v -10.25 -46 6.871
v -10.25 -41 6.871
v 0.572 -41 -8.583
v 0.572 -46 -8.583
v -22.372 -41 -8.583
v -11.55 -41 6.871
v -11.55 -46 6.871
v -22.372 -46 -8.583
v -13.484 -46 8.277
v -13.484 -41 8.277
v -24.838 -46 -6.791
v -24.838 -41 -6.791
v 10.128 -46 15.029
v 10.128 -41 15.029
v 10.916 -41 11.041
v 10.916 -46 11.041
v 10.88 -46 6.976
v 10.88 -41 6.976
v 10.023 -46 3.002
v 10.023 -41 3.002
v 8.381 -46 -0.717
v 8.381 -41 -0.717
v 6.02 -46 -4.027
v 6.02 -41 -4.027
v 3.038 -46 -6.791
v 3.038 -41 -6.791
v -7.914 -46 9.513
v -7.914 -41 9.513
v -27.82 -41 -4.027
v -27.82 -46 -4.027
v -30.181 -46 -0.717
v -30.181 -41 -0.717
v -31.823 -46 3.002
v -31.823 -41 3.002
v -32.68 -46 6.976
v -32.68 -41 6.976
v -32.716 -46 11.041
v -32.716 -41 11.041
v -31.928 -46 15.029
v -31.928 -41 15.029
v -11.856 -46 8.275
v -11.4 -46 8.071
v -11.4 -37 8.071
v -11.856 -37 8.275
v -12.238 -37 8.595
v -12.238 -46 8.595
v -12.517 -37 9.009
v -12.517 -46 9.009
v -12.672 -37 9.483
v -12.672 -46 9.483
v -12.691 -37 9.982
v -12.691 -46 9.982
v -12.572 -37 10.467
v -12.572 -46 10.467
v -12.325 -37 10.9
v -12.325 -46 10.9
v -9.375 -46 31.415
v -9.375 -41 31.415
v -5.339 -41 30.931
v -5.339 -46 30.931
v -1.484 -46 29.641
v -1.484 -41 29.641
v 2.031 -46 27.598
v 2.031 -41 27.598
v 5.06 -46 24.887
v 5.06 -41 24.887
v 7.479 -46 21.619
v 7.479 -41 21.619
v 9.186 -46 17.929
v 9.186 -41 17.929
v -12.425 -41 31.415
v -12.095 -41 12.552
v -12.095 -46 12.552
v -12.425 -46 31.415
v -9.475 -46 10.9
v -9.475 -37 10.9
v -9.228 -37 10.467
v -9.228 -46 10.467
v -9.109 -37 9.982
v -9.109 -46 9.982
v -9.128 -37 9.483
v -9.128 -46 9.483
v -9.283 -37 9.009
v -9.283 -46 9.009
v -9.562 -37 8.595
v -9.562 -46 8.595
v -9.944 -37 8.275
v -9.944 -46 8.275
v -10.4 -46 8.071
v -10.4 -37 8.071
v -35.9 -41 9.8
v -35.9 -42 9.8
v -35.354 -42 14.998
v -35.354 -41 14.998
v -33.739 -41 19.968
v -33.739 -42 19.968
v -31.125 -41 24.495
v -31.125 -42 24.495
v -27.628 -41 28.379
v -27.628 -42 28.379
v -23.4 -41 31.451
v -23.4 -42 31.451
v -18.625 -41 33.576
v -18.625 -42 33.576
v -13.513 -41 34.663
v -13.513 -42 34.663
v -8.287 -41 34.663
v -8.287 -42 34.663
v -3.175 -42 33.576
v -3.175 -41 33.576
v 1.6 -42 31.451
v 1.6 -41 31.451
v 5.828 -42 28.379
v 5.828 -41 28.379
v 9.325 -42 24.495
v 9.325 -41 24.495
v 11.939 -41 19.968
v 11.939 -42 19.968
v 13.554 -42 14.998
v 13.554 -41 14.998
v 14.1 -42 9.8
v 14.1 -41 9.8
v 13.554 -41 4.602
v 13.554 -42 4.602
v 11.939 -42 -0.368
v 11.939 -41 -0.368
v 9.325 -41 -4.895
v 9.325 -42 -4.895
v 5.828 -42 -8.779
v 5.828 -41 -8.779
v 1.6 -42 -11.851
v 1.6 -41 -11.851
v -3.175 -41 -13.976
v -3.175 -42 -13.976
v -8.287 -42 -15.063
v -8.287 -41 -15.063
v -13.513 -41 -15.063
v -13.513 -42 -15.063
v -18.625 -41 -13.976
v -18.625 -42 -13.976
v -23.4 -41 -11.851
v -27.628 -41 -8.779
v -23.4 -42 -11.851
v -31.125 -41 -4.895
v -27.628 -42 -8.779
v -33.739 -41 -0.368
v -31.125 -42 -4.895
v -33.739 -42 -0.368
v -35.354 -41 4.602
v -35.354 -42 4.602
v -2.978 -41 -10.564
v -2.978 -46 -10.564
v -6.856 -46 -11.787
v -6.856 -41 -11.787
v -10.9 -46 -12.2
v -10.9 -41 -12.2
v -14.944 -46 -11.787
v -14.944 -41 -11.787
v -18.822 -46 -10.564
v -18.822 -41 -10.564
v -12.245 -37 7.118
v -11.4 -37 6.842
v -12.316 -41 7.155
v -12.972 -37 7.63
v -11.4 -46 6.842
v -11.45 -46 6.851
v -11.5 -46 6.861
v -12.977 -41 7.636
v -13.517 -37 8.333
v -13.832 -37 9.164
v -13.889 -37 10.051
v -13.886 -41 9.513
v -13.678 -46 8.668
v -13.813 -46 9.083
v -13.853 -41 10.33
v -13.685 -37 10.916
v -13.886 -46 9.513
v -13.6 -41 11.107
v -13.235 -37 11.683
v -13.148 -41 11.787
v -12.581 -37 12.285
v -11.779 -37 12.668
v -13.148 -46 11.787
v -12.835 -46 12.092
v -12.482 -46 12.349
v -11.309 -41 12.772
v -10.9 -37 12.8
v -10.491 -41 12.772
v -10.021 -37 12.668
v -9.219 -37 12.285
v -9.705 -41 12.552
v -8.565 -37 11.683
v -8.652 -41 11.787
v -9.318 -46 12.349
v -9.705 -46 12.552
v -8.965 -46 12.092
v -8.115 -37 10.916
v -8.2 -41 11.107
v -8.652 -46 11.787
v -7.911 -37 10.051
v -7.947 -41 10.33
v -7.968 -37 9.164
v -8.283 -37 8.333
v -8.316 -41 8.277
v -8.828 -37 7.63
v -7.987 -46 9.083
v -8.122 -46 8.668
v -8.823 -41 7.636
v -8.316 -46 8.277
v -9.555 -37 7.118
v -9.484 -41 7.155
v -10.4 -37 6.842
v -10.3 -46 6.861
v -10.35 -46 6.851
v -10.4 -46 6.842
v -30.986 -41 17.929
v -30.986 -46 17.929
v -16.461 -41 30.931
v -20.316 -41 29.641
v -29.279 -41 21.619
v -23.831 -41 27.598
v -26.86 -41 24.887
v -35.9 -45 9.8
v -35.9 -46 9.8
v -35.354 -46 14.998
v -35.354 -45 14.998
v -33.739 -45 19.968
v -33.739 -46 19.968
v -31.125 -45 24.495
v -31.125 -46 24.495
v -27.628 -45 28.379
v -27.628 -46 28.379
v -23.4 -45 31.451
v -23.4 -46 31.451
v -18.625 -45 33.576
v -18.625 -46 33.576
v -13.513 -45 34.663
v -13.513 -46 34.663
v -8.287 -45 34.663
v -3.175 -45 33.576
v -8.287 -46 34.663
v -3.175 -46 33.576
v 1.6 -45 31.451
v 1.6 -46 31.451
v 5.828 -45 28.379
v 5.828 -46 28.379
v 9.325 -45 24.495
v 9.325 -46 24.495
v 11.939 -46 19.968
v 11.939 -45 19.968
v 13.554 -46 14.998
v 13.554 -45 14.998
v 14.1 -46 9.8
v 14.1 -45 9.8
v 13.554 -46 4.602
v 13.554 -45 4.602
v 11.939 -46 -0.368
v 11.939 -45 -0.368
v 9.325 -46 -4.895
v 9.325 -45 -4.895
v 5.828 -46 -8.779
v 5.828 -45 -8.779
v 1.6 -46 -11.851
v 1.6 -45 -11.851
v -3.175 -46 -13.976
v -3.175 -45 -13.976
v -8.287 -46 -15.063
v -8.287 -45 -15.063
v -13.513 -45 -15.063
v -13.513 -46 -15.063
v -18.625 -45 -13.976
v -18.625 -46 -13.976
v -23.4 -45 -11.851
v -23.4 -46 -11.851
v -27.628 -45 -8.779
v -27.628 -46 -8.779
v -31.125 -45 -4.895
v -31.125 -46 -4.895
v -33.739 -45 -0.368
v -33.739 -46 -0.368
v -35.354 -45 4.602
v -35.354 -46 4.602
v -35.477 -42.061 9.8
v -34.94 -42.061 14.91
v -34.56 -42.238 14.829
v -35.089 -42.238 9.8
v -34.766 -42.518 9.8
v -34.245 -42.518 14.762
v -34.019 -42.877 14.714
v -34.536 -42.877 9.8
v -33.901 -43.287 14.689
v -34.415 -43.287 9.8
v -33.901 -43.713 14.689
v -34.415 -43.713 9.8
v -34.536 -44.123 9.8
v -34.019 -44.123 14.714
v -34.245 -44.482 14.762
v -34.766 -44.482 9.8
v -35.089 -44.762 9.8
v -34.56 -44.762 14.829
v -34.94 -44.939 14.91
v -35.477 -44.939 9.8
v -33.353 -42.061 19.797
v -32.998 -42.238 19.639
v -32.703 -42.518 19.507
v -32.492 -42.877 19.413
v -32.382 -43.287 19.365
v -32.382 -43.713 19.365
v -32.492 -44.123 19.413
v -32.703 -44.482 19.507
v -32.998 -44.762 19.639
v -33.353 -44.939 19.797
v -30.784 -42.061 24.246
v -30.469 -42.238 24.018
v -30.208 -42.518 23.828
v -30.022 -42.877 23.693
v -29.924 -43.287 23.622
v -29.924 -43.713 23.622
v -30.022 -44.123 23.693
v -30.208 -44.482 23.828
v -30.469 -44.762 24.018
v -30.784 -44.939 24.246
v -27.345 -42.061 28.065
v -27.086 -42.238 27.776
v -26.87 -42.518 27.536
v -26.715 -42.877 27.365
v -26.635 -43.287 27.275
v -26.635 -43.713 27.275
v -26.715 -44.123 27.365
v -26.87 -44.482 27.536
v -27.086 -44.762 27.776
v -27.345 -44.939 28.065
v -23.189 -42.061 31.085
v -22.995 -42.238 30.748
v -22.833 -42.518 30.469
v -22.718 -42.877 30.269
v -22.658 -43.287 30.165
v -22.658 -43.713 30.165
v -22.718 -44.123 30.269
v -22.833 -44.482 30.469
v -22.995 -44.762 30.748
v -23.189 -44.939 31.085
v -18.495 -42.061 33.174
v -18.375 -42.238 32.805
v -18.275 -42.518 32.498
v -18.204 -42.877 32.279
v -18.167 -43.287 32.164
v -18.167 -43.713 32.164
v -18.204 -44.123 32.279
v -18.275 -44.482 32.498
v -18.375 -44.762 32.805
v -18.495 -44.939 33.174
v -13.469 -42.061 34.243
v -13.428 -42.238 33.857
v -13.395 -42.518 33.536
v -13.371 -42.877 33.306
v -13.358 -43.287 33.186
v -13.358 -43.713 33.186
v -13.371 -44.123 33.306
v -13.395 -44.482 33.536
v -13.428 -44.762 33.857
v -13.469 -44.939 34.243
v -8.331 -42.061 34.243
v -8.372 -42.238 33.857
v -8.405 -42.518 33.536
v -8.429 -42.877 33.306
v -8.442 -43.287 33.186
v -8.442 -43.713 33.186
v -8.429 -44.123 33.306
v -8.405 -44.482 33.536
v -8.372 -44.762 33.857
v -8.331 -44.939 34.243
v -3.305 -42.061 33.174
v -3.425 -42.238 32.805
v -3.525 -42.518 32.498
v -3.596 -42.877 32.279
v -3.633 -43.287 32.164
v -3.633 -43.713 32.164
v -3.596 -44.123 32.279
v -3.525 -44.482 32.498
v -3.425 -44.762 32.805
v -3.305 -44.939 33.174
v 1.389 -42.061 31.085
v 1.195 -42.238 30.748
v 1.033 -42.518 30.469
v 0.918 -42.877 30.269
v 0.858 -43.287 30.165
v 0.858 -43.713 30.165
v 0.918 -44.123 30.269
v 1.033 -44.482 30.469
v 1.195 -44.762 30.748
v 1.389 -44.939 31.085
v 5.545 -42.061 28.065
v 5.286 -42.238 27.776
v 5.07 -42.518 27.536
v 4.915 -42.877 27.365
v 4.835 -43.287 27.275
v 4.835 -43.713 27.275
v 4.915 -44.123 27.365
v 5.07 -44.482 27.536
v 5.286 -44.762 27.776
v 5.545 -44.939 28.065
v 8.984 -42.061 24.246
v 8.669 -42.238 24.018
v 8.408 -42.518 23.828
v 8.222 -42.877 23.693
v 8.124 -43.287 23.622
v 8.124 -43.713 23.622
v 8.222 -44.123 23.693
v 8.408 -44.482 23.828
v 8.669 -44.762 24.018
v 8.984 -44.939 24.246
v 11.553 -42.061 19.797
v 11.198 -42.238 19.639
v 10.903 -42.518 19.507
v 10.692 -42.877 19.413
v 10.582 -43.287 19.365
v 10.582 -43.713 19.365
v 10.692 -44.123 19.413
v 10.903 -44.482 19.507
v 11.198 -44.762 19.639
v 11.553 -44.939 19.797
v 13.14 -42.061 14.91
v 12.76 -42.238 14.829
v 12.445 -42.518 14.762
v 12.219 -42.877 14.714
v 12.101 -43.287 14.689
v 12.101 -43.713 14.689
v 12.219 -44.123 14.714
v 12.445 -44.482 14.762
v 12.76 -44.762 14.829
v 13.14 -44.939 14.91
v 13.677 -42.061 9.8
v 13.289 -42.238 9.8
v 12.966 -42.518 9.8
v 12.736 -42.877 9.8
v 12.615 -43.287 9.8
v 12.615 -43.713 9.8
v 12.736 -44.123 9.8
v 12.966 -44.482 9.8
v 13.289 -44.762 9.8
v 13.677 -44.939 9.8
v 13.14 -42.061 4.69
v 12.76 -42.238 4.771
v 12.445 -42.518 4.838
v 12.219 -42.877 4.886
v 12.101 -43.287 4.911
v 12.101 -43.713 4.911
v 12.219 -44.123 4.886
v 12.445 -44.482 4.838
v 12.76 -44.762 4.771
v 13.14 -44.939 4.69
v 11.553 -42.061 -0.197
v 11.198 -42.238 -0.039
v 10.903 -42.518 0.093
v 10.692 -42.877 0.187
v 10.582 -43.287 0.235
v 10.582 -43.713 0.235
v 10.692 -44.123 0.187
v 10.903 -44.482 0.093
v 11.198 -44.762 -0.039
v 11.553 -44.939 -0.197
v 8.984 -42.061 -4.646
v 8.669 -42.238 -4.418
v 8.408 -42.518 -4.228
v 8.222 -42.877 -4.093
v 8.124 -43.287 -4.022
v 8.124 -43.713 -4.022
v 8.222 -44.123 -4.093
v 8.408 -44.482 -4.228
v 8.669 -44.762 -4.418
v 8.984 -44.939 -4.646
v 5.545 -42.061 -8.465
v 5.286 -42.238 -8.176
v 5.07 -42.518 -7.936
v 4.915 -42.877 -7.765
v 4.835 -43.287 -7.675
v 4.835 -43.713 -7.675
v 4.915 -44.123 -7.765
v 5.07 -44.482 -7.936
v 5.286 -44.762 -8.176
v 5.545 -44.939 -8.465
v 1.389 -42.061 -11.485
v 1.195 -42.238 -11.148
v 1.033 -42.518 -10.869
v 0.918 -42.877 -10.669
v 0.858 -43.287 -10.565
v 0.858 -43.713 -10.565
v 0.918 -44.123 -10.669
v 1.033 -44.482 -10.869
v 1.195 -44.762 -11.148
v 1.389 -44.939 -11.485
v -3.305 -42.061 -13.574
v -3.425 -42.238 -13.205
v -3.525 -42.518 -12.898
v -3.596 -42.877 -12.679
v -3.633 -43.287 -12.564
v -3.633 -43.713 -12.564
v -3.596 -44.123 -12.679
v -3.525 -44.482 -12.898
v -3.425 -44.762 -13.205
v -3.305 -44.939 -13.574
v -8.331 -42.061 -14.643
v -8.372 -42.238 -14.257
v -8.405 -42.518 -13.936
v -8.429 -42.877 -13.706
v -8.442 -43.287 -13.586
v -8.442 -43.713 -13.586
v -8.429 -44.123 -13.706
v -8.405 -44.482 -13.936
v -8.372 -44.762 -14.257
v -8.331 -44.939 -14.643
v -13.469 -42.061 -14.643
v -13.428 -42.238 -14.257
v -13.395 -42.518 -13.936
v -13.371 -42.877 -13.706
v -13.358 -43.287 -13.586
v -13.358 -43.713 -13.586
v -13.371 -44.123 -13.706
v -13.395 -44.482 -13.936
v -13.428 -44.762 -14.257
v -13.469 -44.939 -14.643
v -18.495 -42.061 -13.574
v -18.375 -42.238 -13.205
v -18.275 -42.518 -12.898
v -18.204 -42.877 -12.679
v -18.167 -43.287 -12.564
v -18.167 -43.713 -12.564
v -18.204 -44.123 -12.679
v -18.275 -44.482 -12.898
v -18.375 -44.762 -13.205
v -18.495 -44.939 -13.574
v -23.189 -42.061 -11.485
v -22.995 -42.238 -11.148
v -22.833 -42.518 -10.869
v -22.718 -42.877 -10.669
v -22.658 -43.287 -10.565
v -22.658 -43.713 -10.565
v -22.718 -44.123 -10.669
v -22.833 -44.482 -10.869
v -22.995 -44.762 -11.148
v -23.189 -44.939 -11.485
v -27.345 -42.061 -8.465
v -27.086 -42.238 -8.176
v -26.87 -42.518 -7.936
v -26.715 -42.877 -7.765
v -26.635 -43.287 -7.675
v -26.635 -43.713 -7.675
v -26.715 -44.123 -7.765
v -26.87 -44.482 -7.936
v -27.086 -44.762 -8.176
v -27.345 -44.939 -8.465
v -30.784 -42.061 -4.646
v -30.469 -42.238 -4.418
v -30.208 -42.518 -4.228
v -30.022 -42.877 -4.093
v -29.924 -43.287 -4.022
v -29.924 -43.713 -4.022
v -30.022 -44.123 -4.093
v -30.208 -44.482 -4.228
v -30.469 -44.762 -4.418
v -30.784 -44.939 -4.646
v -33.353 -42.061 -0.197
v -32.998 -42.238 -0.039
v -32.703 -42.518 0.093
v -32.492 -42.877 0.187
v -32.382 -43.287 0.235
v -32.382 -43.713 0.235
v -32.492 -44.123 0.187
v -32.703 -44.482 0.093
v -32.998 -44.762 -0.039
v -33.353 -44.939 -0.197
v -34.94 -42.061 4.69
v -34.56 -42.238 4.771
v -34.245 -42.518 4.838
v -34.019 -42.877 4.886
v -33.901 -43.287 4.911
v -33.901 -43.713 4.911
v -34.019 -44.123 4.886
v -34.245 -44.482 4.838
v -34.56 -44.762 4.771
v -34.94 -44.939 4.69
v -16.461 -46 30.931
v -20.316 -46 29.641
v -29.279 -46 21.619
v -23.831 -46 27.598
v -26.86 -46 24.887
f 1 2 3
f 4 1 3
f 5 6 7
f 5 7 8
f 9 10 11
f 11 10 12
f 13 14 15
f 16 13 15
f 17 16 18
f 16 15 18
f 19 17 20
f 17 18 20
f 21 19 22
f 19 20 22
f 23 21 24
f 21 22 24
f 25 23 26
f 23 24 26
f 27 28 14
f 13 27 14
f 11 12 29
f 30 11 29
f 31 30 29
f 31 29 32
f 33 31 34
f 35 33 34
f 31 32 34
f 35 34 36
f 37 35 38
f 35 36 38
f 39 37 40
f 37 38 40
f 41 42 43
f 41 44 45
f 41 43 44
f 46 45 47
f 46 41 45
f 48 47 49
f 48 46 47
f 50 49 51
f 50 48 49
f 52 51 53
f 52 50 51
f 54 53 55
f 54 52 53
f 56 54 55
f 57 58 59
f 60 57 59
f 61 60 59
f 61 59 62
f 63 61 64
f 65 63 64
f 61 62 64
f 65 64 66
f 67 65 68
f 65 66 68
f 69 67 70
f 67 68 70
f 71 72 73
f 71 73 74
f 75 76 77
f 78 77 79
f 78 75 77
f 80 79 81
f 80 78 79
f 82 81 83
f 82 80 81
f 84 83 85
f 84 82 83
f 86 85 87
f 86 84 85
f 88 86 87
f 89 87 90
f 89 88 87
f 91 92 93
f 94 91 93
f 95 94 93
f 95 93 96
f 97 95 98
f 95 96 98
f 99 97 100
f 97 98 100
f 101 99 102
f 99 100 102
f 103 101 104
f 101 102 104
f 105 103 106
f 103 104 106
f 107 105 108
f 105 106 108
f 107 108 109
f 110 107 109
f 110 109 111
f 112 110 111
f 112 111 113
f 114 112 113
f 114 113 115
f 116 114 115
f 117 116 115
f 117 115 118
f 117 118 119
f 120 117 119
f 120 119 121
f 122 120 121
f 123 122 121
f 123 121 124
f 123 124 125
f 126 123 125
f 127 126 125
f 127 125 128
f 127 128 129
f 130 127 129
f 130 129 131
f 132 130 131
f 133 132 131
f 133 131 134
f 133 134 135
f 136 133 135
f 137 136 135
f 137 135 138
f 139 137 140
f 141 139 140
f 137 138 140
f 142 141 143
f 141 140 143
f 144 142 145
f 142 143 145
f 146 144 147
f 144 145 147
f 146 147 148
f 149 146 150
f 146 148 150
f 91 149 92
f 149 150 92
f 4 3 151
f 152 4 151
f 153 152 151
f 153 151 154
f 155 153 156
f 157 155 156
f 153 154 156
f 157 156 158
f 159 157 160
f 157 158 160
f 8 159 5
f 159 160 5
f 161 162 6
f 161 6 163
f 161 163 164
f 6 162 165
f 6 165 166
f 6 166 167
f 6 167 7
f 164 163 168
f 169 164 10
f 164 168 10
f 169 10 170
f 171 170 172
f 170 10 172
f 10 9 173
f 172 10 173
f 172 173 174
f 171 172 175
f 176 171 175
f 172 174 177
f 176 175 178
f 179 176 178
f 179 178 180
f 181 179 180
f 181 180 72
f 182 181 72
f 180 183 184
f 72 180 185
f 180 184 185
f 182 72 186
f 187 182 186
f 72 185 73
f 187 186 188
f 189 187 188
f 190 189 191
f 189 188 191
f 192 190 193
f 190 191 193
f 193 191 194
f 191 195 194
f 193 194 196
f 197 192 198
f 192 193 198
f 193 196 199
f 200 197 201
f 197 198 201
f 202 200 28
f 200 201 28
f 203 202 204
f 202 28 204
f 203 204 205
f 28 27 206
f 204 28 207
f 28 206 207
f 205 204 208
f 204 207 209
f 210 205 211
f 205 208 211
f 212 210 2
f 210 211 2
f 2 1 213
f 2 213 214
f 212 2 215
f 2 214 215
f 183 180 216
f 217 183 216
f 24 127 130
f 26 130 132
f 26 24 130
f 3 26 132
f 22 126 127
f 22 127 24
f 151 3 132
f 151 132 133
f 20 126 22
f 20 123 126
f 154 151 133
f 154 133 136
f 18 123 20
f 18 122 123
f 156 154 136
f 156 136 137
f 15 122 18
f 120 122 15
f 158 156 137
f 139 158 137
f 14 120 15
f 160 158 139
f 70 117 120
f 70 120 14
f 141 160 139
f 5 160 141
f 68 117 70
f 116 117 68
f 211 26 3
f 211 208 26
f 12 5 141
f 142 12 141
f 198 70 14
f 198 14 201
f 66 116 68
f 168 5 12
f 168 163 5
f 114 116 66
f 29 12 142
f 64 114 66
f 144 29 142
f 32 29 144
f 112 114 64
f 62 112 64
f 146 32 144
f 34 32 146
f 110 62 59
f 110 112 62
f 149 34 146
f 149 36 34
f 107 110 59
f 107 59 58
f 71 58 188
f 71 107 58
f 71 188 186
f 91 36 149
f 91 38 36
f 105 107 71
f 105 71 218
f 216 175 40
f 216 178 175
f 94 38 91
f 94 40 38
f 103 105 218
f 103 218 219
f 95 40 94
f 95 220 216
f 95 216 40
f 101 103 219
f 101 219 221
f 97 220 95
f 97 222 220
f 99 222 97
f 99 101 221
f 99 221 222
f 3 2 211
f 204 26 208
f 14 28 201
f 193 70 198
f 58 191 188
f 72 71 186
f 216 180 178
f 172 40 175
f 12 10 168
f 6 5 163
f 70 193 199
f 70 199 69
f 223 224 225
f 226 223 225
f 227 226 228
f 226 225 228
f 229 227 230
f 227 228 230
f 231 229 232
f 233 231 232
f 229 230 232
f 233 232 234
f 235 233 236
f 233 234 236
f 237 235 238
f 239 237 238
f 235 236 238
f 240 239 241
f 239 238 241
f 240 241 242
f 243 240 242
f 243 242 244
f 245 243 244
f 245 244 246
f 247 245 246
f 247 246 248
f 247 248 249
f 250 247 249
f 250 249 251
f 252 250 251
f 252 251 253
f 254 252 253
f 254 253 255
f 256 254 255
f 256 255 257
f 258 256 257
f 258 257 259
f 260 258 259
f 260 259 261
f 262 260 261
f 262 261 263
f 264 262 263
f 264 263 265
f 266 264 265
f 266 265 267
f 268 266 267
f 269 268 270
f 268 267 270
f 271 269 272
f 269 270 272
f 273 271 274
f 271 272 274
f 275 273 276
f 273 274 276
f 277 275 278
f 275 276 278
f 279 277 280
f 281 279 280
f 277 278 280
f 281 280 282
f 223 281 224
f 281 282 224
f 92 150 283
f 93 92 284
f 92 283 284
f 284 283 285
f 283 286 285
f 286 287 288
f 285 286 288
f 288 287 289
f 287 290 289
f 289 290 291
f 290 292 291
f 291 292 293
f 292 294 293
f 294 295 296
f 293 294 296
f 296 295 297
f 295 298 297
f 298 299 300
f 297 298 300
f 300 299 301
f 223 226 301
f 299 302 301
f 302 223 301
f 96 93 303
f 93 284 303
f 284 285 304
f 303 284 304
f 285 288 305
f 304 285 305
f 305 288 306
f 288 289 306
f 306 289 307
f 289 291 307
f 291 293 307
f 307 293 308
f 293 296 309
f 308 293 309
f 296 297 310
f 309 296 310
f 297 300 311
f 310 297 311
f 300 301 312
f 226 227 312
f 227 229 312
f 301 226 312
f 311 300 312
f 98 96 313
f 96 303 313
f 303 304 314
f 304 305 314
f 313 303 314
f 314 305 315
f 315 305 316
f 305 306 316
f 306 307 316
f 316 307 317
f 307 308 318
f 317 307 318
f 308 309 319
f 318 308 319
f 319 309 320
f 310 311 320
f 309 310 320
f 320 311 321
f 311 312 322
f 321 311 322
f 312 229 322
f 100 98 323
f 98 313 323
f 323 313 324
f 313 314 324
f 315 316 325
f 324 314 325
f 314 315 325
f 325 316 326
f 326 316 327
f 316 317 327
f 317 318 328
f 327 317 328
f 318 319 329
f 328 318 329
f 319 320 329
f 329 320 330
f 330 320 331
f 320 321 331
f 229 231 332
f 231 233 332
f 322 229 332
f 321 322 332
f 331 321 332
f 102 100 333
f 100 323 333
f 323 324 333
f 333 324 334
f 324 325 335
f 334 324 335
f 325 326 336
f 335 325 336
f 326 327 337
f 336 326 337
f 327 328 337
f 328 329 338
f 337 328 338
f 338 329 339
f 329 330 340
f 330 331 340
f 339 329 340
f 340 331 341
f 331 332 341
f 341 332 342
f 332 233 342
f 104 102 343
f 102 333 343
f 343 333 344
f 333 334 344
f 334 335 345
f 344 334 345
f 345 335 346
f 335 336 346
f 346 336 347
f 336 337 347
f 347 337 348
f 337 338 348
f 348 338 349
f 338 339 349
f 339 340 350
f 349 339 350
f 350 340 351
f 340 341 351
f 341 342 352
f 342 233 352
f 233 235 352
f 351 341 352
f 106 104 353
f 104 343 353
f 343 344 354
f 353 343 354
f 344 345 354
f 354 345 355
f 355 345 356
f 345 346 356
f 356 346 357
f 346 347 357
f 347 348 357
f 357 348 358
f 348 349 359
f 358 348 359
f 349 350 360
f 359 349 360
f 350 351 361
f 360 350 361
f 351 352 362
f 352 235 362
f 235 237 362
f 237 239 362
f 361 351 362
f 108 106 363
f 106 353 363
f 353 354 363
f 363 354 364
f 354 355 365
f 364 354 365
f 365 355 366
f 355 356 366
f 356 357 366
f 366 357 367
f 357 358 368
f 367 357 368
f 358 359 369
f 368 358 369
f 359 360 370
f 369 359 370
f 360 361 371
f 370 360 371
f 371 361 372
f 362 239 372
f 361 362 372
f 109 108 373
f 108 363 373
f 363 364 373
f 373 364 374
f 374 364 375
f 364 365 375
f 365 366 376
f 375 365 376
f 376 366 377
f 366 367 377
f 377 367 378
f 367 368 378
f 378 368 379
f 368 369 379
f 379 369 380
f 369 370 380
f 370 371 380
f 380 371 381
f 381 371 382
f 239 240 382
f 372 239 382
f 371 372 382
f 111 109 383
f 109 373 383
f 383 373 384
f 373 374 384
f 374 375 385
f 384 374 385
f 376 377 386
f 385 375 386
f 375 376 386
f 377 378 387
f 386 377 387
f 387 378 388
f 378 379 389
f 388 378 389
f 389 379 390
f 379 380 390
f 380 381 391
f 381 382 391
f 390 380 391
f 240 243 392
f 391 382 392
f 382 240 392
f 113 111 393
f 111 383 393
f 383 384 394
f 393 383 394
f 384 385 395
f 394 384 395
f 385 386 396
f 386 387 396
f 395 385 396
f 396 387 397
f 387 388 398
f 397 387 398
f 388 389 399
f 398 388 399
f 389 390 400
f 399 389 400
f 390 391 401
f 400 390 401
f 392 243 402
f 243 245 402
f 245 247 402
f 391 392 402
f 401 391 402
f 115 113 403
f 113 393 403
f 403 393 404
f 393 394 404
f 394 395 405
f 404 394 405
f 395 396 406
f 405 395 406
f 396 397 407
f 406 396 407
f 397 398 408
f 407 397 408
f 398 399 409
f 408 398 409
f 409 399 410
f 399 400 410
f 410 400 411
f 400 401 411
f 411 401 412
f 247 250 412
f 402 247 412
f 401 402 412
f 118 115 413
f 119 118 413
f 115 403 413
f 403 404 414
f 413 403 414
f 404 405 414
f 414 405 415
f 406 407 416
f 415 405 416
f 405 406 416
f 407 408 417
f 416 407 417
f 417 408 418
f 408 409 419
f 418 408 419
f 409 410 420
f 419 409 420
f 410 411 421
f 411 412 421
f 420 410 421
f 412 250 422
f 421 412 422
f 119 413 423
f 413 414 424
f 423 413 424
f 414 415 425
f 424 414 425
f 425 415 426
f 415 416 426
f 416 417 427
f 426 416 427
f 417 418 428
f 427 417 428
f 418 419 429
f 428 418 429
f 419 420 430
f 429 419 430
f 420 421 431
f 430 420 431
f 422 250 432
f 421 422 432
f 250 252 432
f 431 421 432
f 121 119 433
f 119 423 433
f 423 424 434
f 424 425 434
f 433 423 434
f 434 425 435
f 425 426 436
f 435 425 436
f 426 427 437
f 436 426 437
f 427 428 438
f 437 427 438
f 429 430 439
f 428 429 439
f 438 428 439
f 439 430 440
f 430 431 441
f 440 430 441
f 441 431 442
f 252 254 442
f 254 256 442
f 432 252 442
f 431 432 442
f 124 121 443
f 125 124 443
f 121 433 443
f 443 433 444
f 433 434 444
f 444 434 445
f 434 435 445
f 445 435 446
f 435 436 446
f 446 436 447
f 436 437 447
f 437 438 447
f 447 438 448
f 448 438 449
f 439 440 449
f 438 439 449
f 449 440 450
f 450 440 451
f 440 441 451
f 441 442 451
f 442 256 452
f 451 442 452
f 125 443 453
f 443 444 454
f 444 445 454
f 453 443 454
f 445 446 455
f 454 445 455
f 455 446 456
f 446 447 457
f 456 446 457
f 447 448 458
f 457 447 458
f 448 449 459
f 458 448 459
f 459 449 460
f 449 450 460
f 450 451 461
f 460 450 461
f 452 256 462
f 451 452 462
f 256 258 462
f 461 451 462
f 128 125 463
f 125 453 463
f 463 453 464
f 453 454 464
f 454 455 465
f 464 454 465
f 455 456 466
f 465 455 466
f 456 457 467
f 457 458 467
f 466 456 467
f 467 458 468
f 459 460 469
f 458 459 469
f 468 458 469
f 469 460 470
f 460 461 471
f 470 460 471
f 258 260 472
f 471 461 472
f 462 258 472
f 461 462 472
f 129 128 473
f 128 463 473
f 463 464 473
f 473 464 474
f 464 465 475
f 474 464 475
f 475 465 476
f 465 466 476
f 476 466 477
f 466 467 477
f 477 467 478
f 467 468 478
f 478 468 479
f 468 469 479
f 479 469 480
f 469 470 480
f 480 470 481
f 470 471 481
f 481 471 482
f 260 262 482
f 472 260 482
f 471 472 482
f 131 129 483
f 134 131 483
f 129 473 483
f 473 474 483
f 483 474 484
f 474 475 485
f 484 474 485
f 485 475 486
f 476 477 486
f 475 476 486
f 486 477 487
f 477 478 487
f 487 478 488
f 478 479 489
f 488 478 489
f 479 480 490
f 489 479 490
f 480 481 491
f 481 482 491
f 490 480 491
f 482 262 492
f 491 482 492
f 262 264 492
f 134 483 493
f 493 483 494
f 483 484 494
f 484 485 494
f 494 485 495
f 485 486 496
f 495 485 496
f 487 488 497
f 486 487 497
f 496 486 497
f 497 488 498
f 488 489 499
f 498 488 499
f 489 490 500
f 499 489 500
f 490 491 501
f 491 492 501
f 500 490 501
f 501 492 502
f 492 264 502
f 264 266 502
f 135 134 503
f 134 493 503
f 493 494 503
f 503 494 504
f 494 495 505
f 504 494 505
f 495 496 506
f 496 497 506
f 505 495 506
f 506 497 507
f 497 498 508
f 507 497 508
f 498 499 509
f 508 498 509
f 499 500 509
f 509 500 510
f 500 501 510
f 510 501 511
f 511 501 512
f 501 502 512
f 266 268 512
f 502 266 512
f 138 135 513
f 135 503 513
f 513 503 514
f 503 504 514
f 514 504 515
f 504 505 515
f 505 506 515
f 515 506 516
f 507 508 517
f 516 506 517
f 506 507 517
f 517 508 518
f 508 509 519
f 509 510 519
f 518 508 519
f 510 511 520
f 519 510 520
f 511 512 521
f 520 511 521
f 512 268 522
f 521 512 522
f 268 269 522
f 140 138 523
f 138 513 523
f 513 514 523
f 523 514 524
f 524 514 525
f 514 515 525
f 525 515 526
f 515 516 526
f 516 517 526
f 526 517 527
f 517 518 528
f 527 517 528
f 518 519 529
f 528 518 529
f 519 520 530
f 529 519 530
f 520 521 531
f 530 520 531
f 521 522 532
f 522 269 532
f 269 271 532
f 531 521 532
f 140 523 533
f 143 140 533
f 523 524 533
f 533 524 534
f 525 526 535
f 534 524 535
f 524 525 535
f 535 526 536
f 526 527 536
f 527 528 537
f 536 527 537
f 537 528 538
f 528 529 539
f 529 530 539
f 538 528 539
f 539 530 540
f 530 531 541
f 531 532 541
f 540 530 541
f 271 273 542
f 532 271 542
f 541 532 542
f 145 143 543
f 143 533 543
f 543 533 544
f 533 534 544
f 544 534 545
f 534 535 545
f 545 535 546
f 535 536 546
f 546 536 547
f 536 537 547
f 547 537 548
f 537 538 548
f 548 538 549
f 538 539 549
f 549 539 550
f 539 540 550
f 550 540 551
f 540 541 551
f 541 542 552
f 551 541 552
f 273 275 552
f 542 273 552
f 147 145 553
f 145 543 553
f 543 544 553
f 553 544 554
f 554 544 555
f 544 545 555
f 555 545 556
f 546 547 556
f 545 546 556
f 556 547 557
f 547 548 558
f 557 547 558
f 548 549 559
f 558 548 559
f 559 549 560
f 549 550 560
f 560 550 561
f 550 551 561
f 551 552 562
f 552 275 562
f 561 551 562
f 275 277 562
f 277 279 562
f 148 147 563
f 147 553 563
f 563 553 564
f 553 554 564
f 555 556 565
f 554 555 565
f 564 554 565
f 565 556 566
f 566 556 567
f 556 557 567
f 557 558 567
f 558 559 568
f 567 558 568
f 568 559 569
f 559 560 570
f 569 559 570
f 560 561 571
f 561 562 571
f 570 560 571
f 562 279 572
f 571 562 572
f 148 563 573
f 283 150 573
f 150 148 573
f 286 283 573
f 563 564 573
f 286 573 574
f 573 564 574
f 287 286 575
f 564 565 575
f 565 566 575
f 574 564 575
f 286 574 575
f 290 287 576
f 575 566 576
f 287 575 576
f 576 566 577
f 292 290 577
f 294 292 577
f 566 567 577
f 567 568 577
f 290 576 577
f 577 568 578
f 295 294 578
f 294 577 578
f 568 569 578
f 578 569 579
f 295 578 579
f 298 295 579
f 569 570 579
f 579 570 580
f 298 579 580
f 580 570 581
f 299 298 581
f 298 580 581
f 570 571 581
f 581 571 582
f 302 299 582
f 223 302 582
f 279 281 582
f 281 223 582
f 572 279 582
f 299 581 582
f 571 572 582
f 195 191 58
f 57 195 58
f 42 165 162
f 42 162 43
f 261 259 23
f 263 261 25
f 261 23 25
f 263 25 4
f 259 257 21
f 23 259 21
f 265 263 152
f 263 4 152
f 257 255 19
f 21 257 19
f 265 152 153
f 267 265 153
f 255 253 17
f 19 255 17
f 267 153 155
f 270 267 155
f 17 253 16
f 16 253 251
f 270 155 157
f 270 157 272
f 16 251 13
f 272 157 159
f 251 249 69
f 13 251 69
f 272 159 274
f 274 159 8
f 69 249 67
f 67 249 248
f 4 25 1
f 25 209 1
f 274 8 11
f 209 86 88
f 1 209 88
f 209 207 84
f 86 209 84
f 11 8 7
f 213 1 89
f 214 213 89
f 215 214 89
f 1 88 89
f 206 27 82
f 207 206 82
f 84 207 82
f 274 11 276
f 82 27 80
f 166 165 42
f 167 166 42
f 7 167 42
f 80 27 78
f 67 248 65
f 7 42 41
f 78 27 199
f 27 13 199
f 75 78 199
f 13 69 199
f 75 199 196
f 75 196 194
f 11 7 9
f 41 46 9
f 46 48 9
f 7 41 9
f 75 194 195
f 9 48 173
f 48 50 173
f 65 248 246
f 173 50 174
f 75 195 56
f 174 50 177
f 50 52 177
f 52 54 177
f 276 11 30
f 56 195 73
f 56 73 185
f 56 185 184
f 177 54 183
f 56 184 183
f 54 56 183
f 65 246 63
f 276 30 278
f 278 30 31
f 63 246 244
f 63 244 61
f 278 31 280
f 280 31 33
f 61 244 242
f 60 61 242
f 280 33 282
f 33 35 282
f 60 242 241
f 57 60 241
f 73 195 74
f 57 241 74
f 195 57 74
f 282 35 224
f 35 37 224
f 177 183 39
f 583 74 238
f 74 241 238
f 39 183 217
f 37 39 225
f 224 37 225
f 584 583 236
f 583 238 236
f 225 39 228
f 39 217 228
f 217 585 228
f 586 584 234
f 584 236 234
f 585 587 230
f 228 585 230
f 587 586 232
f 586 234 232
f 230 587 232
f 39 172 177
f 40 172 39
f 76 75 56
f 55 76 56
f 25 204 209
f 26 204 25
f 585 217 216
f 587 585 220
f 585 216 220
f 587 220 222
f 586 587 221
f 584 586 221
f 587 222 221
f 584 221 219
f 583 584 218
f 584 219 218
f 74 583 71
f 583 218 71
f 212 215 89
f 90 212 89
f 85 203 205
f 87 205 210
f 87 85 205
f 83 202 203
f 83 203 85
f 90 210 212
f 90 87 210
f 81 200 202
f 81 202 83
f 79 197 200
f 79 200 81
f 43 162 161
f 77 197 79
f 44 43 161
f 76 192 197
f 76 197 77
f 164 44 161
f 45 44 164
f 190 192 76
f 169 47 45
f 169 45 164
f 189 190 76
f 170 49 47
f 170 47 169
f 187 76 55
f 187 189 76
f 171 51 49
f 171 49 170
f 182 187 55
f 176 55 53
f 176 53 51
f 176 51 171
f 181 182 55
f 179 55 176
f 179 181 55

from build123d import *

# Parameters (mm, degrees)
BOX003_W                    = 10
BOX003_H                    = 10
BOX003_DEPTH                = 10
CYLINDER002_R               = 1.8
CYLINDER002_DEPTH           = 9
BOX030_W                    = 1
BOX030_H                    = 2
BOX030_DEPTH                = 9
CYLINDER010_R               = 3
CYLINDER010_DEPTH           = 9
CYLINDER012_W               = 20
CYLINDER012_H               = 10
CYLINDER012_ANGLE           = 70
CYLINDER012_PLACEMENT_ANGLE = 235
ARRAY_COUNT                 = 5
TORUS_R                     = 1.5
CYLINDER_R                  = 25
CYLINDER_DEPTH              = 5
CUT024_ROLL_ANGLE           = 90
CUT024_PLACEMENT_ANGLE      = 180


with BuildPart() as cube002:
    # Box003 → Box003 (new body)
    with BuildSketch(Plane(origin=(-3, 1.1, 0), x_dir=(1, 0, 0), z_dir=(0, 0, 1))):
        with Locations((5, 5)):
            Rectangle(BOX003_W, BOX003_H)
    extrude(amount=BOX003_DEPTH)


with BuildPart() as shafthole:
    # Cylinder002 → Cylinder002 (new body)
    with BuildSketch(Plane.XY):
        Circle(CYLINDER002_R)
    extrude(amount=CYLINDER002_DEPTH)

    # Cut002: cut Cube002
    add(cube002.part, mode=Mode.SUBTRACT)


with BuildPart() as fusion015:
    # Box030 → Box030 (new body)
    with BuildSketch(Plane(origin=(-0.5, -3.5, 0), x_dir=(1, 0, 0), z_dir=(0, 0, 1))):
        with Locations((0.5, 1)):
            Rectangle(BOX030_W, BOX030_H)
    extrude(amount=BOX030_DEPTH)

    # Fusion015: union shaftHole
    add(shafthole.part)


with BuildPart() as cylinder010:
    # Cylinder010 → Cylinder010 (new body)
    with BuildSketch(Plane.XY):
        Circle(CYLINDER010_R)
    extrude(amount=CYLINDER010_DEPTH)


with BuildPart() as array022:
    # Cylinder012 → Cylinder012 (revolve)
    with BuildSketch(Plane.XZ):
        with Locations((10, 5)):
            Rectangle(CYLINDER012_W, CYLINDER012_H)
    revolve(axis=Axis((0, 0, 0), (0, 0, 1)), revolution_arc=CYLINDER012_ANGLE)


with BuildPart() as array022_1:
    # Cylinder012 placement: moved
    add(array022.part.moved(Location((0, -2, 0))).rotate(Axis((0, -2, 0), (0, 0, 1)), CYLINDER012_PLACEMENT_ANGLE))

    # Array: Array022 ×5 about axis
    array_axis = Axis((0, 0, 0), (0, 0, 1))


with BuildPart() as array022_2:
    add(array022_1.part)
    for i in range(1, ARRAY_COUNT):
        add(array022_1.part.rotate(array_axis, i * 360 / ARRAY_COUNT))


with BuildPart() as torus:
    # Torus → Torus (revolve)
    with BuildSketch(Plane(origin=(0, 0, 2.5), x_dir=(1, 0, 0), z_dir=(0, -1, 0))):
        with Locations((25, 0)):
            Circle(TORUS_R)
    revolve(axis=Axis((0, 0, 2.5), (0, 0, 1)))


with BuildPart() as wheel:
    # Cylinder → Cylinder (new body)
    with BuildSketch(Plane.XY):
        Circle(CYLINDER_R)
    extrude(amount=CYLINDER_DEPTH)

    # Cut001: cut Torus
    add(torus.part, mode=Mode.SUBTRACT)

    # Cut023: cut Array022
    add(array022_2.part, mode=Mode.SUBTRACT)

    # Fusion016: union Cylinder010
    add(cylinder010.part)

    # Cut024: cut Fusion015
    add(fusion015.part, mode=Mode.SUBTRACT)


with BuildPart() as wheel_1:
    # Cut024 roll: moved
    add(wheel.part.rotate(Axis((0, 0, 0), (1, 0, 0)), CUT024_ROLL_ANGLE))


with BuildPart() as wheel_2:
    # Cut024 placement: moved
    add(wheel_1.part.moved(Location((-10.9, -46, 9.8))).rotate(Axis((-10.9, -46, 9.8), (0, 0, 1)), CUT024_PLACEMENT_ANGLE))


solid = wheel_2.part
